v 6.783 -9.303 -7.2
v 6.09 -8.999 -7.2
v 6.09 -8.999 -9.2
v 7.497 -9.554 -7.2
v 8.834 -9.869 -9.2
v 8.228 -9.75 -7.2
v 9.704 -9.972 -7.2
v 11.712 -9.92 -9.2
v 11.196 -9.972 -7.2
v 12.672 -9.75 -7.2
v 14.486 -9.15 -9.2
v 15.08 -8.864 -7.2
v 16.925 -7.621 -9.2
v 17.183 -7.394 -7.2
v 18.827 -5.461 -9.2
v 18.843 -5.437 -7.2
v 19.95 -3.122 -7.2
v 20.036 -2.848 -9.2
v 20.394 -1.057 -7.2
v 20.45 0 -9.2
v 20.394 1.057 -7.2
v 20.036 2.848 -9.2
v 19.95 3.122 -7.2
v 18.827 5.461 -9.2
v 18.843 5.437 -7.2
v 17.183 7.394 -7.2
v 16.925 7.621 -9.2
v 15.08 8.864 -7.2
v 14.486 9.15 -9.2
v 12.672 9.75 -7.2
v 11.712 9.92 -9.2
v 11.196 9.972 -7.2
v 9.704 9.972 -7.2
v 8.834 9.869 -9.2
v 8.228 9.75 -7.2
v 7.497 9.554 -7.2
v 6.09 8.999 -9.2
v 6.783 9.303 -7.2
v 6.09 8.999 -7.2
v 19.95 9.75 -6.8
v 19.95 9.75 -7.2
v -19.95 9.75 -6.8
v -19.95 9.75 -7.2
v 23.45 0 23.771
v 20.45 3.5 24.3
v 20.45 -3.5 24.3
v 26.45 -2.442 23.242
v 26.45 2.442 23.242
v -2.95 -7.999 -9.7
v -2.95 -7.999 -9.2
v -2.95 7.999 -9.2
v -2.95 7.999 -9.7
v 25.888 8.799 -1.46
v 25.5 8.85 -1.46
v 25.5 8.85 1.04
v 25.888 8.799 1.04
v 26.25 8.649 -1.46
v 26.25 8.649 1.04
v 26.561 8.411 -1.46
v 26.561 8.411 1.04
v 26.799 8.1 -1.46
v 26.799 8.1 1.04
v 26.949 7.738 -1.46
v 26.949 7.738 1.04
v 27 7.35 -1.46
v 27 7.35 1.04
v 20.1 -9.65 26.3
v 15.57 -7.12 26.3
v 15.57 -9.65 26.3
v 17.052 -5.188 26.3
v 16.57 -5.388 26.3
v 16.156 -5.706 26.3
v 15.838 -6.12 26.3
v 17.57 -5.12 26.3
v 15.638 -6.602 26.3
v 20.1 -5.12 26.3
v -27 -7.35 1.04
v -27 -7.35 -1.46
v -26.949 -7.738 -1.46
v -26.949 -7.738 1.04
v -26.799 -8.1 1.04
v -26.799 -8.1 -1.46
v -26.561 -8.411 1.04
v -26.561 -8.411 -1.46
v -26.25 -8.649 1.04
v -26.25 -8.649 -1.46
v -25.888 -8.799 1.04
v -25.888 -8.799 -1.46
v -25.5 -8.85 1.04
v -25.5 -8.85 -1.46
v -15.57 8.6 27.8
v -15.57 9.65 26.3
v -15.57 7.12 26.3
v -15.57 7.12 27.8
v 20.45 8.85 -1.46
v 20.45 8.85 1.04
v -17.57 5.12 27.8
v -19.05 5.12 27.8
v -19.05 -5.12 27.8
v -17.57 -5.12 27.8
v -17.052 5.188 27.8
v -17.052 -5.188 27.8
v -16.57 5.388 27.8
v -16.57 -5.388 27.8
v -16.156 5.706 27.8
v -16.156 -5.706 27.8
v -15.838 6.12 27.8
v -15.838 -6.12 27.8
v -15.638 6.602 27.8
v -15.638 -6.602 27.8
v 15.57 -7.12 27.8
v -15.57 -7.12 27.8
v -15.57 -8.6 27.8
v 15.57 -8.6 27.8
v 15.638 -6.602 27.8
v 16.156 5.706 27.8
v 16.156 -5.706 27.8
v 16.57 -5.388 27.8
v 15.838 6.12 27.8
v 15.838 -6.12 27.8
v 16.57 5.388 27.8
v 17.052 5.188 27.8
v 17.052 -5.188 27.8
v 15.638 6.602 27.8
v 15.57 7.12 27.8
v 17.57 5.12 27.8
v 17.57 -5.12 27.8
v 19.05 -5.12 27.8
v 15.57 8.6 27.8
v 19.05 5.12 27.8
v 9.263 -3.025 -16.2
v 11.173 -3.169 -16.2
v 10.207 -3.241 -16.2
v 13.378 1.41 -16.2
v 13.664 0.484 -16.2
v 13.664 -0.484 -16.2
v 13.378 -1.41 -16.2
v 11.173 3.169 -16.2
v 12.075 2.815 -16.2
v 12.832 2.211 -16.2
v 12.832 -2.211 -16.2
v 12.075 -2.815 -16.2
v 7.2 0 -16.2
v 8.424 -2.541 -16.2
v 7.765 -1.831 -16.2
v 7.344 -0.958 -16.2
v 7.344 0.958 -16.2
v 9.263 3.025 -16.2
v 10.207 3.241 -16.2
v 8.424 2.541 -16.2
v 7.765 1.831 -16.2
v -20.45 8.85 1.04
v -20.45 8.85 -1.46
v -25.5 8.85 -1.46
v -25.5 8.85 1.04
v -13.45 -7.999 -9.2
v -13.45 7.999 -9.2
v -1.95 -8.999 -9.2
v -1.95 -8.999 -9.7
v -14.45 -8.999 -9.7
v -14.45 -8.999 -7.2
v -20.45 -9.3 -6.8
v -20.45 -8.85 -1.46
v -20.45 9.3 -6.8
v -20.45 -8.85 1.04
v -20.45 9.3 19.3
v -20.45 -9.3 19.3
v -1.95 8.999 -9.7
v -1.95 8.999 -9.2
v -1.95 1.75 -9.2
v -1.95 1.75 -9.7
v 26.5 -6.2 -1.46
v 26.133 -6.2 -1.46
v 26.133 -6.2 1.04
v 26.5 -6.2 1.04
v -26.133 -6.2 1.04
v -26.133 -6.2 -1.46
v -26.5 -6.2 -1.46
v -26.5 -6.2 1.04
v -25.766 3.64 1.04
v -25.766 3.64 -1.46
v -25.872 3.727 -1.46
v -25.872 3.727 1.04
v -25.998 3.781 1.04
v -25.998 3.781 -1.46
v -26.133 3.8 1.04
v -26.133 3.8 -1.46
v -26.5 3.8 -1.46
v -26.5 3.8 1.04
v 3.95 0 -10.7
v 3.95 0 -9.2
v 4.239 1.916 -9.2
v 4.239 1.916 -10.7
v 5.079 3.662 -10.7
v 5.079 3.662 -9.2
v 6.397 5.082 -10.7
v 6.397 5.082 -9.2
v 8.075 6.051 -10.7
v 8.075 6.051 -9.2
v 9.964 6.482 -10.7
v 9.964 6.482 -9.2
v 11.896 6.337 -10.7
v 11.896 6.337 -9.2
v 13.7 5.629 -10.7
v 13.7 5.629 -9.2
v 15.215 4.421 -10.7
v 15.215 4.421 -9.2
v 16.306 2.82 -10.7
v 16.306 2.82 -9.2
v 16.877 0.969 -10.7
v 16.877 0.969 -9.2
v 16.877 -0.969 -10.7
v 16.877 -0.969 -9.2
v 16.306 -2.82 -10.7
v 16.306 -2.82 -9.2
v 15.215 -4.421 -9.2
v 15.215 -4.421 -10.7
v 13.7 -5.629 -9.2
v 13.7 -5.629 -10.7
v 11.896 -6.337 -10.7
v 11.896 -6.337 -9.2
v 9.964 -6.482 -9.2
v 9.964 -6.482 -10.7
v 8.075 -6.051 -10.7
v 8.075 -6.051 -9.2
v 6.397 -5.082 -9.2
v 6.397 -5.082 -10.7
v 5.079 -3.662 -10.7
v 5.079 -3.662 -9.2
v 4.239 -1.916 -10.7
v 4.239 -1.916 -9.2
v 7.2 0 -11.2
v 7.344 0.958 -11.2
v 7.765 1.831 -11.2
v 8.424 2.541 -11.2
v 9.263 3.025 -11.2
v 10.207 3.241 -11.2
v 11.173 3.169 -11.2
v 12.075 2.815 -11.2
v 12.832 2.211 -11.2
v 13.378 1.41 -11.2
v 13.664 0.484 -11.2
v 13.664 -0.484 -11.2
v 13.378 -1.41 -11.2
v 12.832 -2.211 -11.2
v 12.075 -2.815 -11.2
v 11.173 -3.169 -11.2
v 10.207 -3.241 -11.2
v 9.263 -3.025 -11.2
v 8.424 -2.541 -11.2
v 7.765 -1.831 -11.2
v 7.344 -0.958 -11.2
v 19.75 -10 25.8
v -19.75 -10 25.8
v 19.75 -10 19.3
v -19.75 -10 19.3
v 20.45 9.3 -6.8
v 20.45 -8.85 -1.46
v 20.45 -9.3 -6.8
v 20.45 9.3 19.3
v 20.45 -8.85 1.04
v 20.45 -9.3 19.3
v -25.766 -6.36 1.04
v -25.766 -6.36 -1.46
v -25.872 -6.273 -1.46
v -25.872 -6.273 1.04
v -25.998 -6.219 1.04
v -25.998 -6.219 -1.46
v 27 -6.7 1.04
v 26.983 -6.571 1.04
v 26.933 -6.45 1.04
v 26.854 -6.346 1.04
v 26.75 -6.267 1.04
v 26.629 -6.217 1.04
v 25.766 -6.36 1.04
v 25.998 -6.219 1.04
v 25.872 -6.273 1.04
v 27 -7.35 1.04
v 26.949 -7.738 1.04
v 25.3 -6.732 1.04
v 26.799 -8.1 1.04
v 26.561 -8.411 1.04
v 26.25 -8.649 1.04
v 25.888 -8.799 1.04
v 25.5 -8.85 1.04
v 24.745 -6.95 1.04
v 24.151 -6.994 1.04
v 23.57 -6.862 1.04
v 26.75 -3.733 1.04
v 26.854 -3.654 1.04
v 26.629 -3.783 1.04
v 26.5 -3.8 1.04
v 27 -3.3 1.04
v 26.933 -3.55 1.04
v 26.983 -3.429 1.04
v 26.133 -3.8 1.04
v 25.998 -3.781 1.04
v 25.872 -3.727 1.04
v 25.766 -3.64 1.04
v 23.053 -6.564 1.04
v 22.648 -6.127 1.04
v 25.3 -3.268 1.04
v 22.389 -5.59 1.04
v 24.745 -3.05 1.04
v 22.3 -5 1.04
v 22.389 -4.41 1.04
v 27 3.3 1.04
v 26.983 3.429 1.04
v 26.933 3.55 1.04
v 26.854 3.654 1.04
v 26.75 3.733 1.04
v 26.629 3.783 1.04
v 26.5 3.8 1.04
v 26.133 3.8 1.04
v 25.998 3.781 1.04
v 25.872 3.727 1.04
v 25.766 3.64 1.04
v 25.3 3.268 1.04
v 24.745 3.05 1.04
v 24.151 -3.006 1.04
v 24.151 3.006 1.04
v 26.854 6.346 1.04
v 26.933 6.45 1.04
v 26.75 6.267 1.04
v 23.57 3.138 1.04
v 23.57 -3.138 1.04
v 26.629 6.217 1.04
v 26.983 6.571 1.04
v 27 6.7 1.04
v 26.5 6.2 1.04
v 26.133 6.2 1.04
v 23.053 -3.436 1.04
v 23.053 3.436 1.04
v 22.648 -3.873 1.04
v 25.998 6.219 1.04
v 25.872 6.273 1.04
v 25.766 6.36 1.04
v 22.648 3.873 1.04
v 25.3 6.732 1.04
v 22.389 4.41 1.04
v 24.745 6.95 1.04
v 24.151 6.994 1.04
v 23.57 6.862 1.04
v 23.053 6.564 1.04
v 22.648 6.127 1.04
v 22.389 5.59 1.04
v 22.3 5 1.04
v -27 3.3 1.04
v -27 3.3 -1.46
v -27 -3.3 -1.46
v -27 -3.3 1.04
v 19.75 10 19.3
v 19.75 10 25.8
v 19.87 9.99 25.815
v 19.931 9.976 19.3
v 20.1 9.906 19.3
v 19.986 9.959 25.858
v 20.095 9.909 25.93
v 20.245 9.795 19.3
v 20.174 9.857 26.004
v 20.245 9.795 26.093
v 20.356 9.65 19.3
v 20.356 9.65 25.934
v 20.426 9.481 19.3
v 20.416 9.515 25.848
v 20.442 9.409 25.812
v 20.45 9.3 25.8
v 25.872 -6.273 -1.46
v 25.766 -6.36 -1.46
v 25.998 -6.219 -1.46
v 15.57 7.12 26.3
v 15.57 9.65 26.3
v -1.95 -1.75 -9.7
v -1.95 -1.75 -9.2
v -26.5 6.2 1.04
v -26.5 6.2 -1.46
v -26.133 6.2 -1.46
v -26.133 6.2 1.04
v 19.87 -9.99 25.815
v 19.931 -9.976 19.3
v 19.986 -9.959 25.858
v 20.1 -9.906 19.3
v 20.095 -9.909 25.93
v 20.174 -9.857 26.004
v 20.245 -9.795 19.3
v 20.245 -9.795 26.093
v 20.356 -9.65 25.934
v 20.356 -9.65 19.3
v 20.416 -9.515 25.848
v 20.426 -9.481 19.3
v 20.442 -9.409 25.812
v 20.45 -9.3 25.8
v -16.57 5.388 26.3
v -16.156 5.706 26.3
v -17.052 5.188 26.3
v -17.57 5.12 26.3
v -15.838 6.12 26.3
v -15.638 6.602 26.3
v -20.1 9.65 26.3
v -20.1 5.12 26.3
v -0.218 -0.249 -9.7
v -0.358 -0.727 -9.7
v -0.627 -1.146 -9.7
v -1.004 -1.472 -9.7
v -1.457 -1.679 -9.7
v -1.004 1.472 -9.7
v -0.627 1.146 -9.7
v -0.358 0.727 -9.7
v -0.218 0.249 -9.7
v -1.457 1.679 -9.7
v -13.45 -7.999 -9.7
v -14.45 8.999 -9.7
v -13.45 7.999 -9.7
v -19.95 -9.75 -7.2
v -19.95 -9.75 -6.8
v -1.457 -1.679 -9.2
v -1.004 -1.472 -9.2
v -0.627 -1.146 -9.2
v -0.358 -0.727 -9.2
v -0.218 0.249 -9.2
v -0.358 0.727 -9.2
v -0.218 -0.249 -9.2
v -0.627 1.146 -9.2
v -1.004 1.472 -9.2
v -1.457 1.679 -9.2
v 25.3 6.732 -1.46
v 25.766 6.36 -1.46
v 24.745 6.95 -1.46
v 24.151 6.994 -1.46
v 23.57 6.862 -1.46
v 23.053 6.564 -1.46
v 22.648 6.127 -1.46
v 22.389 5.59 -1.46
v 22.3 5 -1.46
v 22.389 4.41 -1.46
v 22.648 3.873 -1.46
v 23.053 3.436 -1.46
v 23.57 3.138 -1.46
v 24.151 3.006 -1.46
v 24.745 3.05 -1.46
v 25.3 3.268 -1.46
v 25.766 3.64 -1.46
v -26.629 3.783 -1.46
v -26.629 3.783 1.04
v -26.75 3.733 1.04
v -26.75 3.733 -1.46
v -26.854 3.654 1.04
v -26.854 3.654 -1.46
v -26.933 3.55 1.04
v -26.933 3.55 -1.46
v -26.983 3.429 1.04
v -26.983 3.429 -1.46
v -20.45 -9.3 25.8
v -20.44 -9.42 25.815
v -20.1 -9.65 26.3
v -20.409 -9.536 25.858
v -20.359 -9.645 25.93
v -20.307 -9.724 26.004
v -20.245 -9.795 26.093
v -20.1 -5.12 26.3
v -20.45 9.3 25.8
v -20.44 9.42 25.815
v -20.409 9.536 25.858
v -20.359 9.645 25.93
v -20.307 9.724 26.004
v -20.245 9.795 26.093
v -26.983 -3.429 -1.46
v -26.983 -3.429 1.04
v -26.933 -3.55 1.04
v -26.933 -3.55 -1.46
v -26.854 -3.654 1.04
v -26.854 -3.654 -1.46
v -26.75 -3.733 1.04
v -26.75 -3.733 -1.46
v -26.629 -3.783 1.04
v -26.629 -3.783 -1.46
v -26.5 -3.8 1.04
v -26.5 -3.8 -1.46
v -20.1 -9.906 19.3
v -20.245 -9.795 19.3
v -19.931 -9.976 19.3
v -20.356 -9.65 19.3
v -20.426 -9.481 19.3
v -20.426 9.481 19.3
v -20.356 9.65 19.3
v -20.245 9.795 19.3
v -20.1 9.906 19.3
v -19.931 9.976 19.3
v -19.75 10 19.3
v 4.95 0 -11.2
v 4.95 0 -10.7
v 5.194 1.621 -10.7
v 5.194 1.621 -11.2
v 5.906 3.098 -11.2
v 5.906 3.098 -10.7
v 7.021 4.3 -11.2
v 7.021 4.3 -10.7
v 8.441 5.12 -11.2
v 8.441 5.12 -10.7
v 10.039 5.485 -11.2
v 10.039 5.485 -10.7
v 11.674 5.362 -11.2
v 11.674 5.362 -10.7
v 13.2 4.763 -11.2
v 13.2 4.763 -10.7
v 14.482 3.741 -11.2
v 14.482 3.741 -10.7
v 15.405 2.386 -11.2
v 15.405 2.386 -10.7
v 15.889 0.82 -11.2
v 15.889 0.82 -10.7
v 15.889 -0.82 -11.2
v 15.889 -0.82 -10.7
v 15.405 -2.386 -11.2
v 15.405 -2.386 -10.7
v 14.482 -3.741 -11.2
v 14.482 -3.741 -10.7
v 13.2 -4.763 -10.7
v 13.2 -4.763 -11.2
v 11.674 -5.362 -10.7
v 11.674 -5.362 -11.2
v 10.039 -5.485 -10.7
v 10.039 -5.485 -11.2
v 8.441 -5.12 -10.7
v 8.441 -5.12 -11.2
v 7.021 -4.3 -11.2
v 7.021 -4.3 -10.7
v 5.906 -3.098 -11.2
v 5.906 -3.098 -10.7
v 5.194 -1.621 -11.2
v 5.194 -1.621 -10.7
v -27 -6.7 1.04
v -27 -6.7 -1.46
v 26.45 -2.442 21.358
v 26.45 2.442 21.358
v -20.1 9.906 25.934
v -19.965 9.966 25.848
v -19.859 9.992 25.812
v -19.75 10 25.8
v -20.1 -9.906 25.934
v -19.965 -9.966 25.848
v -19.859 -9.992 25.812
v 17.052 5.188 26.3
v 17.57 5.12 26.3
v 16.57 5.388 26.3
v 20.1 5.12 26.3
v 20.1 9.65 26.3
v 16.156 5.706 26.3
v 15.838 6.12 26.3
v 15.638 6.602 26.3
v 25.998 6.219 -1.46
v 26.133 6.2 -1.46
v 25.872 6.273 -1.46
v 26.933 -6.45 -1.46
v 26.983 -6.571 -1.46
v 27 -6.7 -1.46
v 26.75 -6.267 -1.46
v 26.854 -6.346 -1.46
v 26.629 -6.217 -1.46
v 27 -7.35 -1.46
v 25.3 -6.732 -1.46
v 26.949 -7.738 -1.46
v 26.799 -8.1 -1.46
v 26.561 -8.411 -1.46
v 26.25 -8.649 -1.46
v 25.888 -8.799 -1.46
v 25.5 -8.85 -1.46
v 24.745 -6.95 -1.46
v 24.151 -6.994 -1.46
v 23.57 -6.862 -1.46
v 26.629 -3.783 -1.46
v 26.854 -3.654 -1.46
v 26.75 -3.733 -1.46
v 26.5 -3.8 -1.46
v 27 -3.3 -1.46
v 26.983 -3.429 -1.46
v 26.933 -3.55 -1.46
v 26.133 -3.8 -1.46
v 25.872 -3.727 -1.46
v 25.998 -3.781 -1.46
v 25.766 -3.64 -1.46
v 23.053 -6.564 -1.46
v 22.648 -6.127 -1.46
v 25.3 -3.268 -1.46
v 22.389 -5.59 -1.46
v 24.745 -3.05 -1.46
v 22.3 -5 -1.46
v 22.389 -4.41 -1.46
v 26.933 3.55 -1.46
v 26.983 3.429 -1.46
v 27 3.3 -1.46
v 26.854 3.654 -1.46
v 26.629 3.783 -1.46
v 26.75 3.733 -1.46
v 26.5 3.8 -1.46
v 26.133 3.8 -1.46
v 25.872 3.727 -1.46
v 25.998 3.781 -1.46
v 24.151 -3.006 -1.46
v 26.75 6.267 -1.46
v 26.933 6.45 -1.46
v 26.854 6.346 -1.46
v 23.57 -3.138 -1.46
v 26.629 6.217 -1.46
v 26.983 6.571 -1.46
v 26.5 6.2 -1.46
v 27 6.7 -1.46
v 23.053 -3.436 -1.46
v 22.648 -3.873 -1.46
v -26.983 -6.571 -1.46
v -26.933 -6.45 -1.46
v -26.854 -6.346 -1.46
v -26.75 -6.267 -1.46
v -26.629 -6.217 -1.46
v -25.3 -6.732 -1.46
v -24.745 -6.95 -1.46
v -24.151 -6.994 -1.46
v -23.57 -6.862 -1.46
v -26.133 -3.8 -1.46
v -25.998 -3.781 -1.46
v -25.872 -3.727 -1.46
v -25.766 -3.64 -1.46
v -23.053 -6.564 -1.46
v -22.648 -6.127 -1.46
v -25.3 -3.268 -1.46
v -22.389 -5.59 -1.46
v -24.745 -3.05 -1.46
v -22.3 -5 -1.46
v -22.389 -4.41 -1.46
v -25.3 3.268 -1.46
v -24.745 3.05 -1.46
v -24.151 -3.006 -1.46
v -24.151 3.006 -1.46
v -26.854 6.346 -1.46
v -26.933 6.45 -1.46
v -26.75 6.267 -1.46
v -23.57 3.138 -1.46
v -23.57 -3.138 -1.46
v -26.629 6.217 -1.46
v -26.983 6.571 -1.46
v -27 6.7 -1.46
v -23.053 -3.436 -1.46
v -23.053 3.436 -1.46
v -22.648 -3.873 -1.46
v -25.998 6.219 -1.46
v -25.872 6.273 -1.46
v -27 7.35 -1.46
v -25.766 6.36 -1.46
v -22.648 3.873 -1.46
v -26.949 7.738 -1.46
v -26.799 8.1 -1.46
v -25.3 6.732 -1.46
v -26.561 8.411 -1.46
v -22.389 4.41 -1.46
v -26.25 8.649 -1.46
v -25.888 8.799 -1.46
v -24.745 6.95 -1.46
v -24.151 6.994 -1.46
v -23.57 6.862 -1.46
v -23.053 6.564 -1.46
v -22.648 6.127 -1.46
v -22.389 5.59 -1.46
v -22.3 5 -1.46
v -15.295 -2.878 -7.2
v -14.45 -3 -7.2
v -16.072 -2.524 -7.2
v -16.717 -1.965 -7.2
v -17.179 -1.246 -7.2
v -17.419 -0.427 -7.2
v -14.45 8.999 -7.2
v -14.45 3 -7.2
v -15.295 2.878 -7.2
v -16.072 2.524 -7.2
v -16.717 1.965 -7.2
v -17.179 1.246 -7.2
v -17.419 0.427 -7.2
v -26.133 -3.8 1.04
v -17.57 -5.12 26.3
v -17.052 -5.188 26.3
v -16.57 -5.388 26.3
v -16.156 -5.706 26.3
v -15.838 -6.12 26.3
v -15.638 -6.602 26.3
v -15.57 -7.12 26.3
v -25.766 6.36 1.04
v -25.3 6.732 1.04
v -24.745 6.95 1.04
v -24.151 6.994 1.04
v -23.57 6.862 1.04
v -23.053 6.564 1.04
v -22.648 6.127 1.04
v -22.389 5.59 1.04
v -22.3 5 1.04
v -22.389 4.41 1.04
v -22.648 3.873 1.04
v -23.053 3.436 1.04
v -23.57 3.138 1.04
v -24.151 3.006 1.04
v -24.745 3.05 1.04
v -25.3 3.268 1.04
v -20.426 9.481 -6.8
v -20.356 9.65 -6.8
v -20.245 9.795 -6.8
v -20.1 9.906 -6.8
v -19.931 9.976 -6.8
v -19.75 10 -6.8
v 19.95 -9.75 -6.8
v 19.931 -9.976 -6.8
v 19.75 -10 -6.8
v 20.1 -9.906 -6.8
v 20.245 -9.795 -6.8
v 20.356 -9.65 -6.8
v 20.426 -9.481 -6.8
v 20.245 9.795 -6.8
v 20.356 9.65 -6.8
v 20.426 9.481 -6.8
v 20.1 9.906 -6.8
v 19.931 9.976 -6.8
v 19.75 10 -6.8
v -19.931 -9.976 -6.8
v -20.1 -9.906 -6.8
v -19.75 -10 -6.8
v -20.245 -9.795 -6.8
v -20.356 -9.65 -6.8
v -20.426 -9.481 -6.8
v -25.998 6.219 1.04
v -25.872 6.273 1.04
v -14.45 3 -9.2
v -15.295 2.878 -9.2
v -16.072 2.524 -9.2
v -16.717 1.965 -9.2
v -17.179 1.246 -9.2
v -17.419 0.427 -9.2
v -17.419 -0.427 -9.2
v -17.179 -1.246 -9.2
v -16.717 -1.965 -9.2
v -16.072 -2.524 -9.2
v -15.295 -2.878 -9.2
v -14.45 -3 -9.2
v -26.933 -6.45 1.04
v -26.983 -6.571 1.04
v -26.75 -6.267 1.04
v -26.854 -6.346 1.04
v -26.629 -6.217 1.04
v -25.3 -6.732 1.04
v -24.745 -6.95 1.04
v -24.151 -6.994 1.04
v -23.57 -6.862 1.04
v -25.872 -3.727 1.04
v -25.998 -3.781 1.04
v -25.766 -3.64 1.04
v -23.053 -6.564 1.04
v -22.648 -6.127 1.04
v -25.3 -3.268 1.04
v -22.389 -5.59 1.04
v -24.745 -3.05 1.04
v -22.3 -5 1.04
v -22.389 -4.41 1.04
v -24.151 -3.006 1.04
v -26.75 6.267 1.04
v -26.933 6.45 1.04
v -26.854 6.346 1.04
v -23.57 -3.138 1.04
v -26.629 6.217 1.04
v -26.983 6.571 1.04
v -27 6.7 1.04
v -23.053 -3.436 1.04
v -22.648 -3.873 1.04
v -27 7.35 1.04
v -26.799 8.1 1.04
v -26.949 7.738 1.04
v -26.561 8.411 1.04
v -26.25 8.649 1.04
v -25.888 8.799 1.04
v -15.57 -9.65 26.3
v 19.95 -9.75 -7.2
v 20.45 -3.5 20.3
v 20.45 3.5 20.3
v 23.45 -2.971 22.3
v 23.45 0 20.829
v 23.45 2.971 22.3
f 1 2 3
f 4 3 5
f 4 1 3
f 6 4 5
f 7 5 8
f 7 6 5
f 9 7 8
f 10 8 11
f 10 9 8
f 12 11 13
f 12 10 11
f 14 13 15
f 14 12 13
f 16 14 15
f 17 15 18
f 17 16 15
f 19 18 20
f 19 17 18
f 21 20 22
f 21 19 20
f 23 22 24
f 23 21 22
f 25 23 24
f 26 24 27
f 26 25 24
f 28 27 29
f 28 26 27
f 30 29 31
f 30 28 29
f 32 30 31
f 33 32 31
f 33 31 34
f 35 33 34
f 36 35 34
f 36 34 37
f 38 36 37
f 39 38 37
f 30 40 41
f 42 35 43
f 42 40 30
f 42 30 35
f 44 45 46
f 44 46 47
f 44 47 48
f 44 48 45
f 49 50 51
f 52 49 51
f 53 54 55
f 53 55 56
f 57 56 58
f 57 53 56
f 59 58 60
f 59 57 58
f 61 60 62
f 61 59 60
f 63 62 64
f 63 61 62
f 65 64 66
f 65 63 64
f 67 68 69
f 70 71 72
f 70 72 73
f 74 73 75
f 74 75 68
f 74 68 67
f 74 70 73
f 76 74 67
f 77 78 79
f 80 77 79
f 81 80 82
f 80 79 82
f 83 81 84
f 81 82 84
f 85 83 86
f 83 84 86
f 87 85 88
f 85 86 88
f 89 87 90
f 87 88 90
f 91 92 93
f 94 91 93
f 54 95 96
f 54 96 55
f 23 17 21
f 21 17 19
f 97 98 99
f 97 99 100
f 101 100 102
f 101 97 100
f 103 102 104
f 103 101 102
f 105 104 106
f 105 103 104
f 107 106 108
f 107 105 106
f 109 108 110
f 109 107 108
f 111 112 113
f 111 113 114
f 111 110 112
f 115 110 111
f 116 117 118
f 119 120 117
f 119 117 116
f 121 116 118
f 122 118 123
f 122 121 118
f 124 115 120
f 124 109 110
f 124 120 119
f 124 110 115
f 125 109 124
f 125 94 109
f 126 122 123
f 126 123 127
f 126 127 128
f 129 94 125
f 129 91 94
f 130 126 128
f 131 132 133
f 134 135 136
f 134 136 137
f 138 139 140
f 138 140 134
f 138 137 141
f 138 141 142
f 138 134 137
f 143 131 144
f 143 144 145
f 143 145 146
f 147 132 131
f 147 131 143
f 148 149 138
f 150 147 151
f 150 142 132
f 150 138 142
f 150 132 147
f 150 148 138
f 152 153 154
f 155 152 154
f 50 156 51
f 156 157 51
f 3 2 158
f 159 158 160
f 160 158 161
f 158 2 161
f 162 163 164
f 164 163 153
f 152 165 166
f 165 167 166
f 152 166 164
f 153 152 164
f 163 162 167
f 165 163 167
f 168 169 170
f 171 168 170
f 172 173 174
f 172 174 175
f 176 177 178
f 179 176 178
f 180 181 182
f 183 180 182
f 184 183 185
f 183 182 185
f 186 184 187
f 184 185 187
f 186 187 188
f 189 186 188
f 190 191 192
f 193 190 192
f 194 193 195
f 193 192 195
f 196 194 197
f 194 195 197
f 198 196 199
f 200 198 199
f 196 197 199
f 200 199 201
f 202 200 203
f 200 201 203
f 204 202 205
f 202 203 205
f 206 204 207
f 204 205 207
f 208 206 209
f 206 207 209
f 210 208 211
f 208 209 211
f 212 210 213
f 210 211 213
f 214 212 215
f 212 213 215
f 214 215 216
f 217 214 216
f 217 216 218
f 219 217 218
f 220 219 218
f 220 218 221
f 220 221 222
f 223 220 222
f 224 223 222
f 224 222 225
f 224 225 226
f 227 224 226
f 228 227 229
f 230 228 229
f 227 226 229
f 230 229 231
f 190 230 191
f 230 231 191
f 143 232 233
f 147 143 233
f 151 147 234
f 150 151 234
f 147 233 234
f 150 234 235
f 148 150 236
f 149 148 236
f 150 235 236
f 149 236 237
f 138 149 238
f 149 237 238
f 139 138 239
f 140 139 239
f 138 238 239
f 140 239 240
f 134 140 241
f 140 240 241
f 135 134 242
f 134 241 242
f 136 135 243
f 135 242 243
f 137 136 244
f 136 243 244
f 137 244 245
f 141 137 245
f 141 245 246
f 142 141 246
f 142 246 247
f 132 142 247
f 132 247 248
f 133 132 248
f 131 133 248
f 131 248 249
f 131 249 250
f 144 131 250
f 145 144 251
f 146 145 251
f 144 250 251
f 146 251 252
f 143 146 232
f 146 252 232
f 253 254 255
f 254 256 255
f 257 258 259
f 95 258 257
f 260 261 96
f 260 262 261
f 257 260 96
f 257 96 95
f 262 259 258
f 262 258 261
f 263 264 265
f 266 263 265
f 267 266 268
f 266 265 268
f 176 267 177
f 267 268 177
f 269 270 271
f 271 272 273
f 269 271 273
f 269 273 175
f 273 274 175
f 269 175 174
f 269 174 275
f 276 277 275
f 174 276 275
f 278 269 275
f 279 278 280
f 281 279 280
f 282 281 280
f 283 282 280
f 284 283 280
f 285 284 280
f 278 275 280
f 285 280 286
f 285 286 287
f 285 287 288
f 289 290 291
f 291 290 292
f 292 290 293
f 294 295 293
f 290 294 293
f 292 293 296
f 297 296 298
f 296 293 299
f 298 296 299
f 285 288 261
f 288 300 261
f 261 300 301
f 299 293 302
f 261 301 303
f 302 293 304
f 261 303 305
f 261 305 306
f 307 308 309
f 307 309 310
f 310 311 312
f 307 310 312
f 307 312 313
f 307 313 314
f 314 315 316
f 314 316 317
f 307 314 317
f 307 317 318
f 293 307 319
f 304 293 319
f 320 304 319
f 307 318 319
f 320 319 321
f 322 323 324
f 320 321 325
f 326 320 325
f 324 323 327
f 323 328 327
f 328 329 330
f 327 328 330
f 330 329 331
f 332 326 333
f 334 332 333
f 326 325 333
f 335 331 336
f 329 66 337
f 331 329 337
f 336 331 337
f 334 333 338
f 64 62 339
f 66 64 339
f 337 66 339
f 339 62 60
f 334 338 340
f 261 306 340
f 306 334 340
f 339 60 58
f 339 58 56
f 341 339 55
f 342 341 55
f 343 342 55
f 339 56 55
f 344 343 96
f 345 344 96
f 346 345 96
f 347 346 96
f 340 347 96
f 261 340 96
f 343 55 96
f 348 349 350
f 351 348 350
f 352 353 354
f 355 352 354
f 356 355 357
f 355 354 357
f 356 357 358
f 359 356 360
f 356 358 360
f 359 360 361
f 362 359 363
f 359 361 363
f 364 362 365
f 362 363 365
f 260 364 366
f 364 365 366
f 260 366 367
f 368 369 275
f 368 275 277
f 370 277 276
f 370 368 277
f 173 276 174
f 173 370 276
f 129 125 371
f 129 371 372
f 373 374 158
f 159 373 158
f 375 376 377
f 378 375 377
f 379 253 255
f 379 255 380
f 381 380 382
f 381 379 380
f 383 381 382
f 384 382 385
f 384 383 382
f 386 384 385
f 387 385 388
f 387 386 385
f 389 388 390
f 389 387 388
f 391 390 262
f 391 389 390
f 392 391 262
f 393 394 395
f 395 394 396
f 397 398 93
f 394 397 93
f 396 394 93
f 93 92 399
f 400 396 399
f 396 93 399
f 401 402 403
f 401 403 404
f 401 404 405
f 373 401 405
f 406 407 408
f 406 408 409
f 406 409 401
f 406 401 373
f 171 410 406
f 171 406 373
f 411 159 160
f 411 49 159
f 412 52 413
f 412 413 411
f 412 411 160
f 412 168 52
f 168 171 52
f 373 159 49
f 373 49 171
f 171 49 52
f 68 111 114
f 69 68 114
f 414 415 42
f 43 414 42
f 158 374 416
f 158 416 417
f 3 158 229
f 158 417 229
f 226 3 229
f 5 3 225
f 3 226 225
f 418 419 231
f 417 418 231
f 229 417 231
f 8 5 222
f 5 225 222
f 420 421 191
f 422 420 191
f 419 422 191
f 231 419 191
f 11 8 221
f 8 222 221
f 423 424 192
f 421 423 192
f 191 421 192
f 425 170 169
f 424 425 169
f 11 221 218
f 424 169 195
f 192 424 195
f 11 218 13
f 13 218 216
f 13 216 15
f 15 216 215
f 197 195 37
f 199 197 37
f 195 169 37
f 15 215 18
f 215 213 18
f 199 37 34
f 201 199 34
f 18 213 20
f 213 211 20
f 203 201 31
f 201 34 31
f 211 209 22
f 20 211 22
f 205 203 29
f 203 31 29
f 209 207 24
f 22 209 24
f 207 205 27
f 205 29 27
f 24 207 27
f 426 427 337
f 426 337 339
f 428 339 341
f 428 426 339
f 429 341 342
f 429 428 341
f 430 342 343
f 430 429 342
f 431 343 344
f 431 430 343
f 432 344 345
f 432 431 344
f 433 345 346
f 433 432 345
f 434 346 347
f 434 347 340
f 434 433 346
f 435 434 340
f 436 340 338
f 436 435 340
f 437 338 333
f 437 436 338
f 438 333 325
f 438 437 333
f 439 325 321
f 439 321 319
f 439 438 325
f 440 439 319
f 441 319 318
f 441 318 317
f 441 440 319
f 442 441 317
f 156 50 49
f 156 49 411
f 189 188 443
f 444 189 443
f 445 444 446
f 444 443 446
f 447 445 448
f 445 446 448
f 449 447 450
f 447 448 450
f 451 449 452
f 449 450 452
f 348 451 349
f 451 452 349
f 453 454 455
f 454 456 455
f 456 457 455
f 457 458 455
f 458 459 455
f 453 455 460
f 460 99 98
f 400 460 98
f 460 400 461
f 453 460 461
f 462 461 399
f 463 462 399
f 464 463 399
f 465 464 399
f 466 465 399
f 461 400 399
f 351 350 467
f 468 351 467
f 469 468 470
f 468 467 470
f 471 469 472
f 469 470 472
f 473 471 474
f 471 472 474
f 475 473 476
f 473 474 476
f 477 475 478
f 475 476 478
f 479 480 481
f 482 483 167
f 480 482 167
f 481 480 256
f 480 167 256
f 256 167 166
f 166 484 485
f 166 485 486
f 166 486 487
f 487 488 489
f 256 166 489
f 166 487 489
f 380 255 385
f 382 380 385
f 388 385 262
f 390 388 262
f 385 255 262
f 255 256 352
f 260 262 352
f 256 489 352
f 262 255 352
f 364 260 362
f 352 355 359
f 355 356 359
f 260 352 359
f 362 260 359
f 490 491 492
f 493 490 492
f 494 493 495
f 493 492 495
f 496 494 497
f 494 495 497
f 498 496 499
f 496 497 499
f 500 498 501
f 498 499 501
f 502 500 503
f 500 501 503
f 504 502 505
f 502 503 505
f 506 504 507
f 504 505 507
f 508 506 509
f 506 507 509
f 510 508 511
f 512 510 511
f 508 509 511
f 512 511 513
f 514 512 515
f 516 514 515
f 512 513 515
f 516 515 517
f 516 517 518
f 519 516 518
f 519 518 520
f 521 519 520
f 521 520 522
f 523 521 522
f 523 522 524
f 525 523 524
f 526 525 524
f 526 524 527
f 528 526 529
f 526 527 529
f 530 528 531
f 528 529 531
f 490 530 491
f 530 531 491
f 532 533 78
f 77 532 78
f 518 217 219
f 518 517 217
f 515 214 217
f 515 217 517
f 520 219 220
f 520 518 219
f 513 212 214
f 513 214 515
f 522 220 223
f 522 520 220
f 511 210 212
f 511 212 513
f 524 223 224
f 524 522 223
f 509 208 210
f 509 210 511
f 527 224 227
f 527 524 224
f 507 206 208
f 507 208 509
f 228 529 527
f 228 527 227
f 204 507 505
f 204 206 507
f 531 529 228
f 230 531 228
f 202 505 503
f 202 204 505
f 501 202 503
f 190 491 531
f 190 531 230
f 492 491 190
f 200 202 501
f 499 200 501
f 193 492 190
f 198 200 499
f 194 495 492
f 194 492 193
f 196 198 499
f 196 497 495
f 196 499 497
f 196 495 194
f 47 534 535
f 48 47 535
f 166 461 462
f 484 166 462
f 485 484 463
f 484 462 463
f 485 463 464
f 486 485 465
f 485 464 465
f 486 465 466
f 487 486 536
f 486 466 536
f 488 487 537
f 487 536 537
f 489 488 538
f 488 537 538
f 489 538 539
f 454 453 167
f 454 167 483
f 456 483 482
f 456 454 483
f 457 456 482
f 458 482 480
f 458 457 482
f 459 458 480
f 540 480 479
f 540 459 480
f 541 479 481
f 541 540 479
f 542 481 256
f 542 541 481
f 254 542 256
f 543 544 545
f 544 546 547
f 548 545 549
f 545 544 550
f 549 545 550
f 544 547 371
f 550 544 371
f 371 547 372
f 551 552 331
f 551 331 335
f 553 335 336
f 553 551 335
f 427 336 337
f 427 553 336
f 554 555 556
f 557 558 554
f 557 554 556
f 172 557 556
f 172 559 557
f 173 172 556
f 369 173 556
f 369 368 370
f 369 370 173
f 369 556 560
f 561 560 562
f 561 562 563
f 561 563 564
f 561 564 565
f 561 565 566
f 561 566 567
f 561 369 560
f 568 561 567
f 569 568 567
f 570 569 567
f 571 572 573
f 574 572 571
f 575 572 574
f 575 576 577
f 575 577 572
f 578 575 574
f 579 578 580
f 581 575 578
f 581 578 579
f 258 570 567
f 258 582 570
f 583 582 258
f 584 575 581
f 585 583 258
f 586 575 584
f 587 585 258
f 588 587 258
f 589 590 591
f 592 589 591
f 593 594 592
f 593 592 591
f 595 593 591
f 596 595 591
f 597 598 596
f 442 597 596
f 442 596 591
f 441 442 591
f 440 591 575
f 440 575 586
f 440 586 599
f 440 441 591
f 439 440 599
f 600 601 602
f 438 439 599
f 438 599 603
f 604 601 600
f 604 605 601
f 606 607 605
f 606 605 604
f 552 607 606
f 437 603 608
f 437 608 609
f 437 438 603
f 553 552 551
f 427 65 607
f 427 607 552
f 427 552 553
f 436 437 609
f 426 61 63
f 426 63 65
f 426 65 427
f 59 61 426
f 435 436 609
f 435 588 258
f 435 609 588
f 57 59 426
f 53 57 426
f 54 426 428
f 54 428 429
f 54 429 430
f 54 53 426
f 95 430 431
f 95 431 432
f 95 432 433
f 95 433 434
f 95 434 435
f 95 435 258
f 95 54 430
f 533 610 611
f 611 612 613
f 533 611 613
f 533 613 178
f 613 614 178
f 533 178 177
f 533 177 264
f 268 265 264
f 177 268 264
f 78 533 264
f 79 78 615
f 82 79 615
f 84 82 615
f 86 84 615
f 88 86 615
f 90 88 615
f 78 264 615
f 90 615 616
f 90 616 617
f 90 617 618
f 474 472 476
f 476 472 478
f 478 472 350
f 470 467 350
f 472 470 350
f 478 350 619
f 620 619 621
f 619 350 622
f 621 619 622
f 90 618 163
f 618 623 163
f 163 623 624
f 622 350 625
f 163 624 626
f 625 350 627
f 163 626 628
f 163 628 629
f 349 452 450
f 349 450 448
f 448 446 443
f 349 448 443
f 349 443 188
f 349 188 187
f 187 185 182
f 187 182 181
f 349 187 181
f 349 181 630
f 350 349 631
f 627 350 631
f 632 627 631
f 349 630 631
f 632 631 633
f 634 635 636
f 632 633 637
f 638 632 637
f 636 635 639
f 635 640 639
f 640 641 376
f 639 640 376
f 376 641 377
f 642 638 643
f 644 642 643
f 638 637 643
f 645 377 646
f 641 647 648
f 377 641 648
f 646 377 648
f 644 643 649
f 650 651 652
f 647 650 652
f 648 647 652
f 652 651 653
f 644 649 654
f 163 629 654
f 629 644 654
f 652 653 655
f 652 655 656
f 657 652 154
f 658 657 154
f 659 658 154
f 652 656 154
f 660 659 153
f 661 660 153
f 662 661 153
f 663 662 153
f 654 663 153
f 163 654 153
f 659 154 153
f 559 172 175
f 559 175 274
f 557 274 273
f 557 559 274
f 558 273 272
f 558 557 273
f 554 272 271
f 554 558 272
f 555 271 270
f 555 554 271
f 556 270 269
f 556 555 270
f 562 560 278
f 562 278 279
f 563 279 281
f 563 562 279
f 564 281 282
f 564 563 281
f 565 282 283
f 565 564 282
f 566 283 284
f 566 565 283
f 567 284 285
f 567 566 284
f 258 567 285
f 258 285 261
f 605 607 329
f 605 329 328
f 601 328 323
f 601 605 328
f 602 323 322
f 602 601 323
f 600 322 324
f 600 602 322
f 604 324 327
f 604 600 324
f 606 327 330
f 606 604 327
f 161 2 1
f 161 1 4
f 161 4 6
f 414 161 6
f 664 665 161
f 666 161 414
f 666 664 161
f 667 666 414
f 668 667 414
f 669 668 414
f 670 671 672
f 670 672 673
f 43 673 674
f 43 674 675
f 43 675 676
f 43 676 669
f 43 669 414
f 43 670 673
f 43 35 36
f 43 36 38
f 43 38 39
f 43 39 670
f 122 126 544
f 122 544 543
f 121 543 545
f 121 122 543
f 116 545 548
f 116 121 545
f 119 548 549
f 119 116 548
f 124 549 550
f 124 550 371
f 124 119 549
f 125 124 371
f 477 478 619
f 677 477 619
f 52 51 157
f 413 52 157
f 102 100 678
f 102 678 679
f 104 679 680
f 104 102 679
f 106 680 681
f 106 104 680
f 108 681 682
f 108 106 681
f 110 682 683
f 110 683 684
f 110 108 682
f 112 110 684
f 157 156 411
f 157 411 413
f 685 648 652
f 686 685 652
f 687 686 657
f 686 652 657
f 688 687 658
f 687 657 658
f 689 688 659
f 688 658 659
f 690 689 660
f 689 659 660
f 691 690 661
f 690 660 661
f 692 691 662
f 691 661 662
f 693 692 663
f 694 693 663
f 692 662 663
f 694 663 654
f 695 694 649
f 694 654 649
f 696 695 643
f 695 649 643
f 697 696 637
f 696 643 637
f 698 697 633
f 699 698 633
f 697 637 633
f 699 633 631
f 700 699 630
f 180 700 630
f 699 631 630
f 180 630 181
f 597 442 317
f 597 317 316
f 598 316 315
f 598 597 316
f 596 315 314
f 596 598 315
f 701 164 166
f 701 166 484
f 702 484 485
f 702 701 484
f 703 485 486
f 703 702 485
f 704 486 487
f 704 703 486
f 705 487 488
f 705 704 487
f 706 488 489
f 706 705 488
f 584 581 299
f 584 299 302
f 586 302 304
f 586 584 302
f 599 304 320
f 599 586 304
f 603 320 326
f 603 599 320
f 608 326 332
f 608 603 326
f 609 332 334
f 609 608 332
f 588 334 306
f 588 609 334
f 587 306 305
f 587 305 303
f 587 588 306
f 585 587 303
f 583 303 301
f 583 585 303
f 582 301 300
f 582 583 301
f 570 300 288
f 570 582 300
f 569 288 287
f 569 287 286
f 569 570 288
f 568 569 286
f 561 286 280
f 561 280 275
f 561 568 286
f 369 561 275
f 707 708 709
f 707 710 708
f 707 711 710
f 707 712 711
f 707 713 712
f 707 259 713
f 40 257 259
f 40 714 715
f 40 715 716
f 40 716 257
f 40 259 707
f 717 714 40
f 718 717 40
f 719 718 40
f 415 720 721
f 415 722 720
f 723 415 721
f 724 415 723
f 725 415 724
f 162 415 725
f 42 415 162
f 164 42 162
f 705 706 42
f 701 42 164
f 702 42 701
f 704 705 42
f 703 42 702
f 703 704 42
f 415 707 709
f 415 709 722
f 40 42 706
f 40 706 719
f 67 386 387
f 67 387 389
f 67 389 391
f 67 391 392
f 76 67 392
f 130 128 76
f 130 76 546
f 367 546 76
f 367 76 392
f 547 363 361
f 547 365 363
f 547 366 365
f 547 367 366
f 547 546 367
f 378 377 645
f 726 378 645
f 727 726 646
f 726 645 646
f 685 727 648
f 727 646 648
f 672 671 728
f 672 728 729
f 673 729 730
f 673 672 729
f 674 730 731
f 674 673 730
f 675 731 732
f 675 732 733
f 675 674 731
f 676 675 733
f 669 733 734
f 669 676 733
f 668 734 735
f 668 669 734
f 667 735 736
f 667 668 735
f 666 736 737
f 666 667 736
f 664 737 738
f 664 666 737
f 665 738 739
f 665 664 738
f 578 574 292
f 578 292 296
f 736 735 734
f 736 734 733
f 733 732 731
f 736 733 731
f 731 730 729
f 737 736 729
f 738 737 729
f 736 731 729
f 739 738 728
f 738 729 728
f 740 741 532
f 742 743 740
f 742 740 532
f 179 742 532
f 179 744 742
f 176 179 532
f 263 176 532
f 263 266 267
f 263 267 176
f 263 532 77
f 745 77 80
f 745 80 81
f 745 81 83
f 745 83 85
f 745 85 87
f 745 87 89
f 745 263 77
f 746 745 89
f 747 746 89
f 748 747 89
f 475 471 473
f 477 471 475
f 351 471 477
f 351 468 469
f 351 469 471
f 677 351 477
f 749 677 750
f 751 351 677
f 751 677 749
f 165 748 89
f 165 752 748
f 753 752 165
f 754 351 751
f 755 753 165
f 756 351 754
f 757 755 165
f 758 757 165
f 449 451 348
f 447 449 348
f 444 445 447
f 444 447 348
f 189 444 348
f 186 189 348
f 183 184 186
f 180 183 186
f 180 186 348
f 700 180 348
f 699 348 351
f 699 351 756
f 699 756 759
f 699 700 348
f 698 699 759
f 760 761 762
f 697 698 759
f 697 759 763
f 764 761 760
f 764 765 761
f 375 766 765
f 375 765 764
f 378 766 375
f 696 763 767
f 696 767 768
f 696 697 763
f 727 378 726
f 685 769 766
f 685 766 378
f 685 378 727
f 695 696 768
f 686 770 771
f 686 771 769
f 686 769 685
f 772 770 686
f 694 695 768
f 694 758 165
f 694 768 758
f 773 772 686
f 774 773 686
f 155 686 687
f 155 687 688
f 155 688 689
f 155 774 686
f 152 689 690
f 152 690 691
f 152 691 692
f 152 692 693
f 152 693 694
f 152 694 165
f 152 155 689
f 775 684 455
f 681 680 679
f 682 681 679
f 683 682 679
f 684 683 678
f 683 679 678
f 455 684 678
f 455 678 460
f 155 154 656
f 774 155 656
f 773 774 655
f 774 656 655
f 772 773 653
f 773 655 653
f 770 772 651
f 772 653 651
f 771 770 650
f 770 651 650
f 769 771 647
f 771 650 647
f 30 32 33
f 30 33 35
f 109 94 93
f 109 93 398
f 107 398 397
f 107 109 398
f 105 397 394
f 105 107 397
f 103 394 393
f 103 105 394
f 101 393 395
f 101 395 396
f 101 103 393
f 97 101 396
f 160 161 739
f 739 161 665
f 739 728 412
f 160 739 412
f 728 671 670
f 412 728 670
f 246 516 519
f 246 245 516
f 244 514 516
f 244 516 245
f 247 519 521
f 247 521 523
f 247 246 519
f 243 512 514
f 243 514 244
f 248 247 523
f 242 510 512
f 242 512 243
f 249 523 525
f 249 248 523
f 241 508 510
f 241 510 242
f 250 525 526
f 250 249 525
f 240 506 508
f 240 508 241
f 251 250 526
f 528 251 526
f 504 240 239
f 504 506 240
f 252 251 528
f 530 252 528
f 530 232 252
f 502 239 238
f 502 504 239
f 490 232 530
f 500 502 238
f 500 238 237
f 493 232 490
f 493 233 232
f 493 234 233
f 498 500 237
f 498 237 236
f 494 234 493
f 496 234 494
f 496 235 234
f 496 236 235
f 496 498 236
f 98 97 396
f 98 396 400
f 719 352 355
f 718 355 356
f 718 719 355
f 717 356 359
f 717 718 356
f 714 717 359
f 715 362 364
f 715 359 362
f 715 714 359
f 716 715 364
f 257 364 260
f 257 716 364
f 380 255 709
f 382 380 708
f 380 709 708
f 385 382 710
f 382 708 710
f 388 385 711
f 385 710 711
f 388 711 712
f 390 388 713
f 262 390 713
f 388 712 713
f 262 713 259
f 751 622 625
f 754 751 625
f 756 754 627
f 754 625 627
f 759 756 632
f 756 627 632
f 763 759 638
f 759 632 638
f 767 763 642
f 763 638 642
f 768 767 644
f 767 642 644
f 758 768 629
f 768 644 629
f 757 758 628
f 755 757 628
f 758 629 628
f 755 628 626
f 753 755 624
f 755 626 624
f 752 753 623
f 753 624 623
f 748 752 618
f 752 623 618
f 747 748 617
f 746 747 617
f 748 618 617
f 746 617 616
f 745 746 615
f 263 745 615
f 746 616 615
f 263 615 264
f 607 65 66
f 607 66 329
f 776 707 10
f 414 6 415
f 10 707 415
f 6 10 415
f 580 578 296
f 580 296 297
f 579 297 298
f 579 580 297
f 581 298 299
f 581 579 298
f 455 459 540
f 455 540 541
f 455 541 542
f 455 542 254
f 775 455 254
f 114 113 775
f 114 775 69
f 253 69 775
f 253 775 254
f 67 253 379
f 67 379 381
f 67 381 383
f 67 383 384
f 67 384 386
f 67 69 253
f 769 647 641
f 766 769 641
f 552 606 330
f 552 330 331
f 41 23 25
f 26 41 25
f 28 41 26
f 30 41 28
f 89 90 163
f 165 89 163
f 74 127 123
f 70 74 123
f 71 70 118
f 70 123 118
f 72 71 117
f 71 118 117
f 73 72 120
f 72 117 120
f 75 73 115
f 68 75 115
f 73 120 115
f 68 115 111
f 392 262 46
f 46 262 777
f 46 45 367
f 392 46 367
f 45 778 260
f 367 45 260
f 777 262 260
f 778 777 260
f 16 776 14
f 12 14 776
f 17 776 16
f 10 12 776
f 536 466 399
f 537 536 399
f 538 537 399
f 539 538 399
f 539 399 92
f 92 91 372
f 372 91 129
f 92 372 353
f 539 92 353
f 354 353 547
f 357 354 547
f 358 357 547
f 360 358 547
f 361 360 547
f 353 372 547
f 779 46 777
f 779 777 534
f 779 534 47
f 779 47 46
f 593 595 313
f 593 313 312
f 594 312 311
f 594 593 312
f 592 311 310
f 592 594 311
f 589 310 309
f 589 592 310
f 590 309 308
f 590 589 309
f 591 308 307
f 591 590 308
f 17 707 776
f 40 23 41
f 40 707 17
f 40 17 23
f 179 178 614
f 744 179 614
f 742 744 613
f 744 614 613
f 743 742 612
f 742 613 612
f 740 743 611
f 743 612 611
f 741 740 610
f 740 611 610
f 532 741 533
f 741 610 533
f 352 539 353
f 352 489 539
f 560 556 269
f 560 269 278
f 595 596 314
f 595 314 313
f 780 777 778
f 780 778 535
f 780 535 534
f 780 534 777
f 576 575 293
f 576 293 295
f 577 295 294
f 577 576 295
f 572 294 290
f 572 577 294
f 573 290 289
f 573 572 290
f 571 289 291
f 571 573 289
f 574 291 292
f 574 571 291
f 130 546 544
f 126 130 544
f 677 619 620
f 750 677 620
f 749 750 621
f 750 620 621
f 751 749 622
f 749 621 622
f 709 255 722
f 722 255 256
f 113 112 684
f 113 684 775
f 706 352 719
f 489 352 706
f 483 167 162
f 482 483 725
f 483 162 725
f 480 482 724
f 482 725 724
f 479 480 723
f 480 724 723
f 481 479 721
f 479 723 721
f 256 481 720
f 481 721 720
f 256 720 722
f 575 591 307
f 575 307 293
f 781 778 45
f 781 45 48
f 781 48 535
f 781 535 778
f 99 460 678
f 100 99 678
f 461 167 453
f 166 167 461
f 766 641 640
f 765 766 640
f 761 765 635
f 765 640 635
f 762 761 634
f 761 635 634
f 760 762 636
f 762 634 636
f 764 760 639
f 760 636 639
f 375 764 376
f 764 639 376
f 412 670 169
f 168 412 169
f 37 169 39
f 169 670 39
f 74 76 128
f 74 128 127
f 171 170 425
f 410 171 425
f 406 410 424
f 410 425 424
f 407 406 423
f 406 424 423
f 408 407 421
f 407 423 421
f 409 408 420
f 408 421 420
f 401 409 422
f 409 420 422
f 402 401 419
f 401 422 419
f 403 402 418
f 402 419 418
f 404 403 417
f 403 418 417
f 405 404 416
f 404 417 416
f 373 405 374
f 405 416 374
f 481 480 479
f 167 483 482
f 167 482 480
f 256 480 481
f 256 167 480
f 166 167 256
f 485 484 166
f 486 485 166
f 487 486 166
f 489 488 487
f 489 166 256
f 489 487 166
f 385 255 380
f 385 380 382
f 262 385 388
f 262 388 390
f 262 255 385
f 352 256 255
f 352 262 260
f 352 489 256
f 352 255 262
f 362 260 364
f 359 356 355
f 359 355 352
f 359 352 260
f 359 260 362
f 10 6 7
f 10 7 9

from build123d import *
from OCP.BRepFilletAPI import BRepFilletAPI_MakeChamfer

# Parameters (mm, degrees)
SKETCH1_W            = 40.9
SKETCH1_H            = 20
BOSS_EXTRUDE1_DEPTH  = 19.3
SKETCH3_W            = 40.9
SKETCH3_H            = 20
BOSS_EXTRUDE2_DEPTH  = 6.8
SKETCH4_W            = 40.9
SKETCH4_H            = 20
BOSS_EXTRUDE3_DEPTH  = 8.5
CHAMFER1_SIZE        = 2
CHAMFER1_SIZE2       = 1.400415076
CUT_EXTRUDE1_DEPTH   = 1.5
SKETCH6_W            = 39.9
SKETCH6_H            = 19.5
BOSS_EXTRUDE4_DEPTH  = 0.4
BOSS_EXTRUDE5_DEPTH  = 2
SKETCH8_R            = 6.5
BOSS_EXTRUDE6_DEPTH  = 1.5
SKETCH9_R            = 5.5
BOSS_EXTRUDE8_DEPTH  = 0.5
SKETCH11_R           = 3.25
BOSS_EXTRUDE9_DEPTH  = 5
SKETCH12_W           = 10.5
SKETCH12_H           = 15.998933302
BOSS_EXTRUDE10_DEPTH = 0.5
FILLET1_R            = 0.7
FILLET2_R            = 0.7
FILLET3_R            = 0.7
BOSS_EXTRUDE11_START = -5.74
BOSS_EXTRUDE11_DEPTH = 2.5
SKETCH14_W           = 4
SKETCH14_H           = 7
BOSS_EXTRUDE12_DEPTH = 6
BOSS_EXTRUDE12_TAPER = 10


with BuildPart() as part:
    # Sketch1 → Boss-Extrude1 (new body)
    with BuildSketch(Plane.XY):
        Rectangle(SKETCH1_W, SKETCH1_H)
    extrude(amount=BOSS_EXTRUDE1_DEPTH)

    # Fillet1
    fillet1_edges = [part.edges().sort_by_distance(p)[0] for p in [
        (-20.45, 10, 9.65),
        (20.45, 10, 9.65),
        (20.45, -10, 9.65),
        (-20.45, -10, 9.65),
    ]]
    fillet(fillet1_edges, radius=FILLET1_R)



with BuildPart() as body_2:
    # Sketch3 → Boss-Extrude2 (new body)
    with BuildSketch(Plane(origin=(0, 0, 0), x_dir=(-1, 0, 0), z_dir=(0, 0, -1))):
        Rectangle(SKETCH3_W, SKETCH3_H)
    extrude(amount=BOSS_EXTRUDE2_DEPTH)

    # Sketch6 → Boss-Extrude4 (add)
    with BuildSketch(Plane(origin=(0, 0, -6.8), x_dir=(-1, 0, 0), z_dir=(0, 0, -1))):
        Rectangle(SKETCH6_W, SKETCH6_H)
    extrude(amount=BOSS_EXTRUDE4_DEPTH)

    # Sketch7 → Boss-Extrude5 (add)
    with BuildSketch(Plane(origin=(0, 0, -7.2), x_dir=(-1, 0, 0), z_dir=(0, 0, -1))):
        with BuildLine():
            Line((-6.09, 8.999466651), (14.45, 8.999466651))
            Line((14.45, 8.999466651), (14.45, 3))
            ThreePointArc((14.45, 3), (17.45, 0), (14.45, -3))
            Line((14.45, -3), (14.45, -8.999466651))
            Line((14.45, -8.999466651), (-6.09, -8.999466651))
            ThreePointArc((-6.09, -8.999466651), (-20.45, 0), (-6.09, 8.999466651))
        make_face()
    extrude(amount=BOSS_EXTRUDE5_DEPTH)

    # Sketch8 → Boss-Extrude6 (add)
    with BuildSketch(Plane(origin=(0, 0, -9.2), x_dir=(-1, 0, 0), z_dir=(0, 0, -1))):
        with Locations((-10.45, 0)):
            Circle(SKETCH8_R)
    extrude(amount=BOSS_EXTRUDE6_DEPTH)

    # Sketch9 → Boss-Extrude8 (add)
    with BuildSketch(Plane(origin=(0, 0, -10.7), x_dir=(-1, 0, 0), z_dir=(0, 0, -1))):
        with Locations((-10.45, 0)):
            Circle(SKETCH9_R)
    extrude(amount=BOSS_EXTRUDE8_DEPTH)

    # Sketch11 → Boss-Extrude9 (add)
    with BuildSketch(Plane(origin=(0, 0, -11.2), x_dir=(-1, 0, 0), z_dir=(0, 0, -1))):
        with Locations((-10.45, 0)):
            Circle(SKETCH11_R)
    extrude(amount=BOSS_EXTRUDE9_DEPTH)

    # Sketch12 → Boss-Extrude10 (add)
    with BuildSketch(Plane(origin=(0, 0, -9.2), x_dir=(-1, 0, 0), z_dir=(0, 0, -1))):
        with BuildLine():
            Line((14.45, 8.999466651), (1.95, 8.999466651))
            Line((1.95, 8.999466651), (1.95, 1.75))
            ThreePointArc((1.95, 1.75), (0.2, 0), (1.95, -1.75))
            Line((1.95, -1.75), (1.95, -8.999466651))
            Line((1.95, -8.999466651), (14.45, -8.999466651))
            Line((14.45, -8.999466651), (14.45, 8.999466651))
        make_face()
        with Locations((8.2, 0)):
            Rectangle(SKETCH12_W, SKETCH12_H, mode=Mode.SUBTRACT)
    extrude(amount=BOSS_EXTRUDE10_DEPTH)

    # Fillet2
    fillet2_edges = [body_2.edges().sort_by_distance(p)[0] for p in [
        (20.45, -10, -3.4),
        (20.45, 10, -3.4),
        (-20.45, 10, -3.4),
        (-20.45, -10, -3.4),
    ]]
    fillet(fillet2_edges, radius=FILLET2_R)


with BuildPart() as body_3:
    # Sketch4 → Boss-Extrude3 (new body)
    with BuildSketch(Plane.XY.offset(19.3)):
        Rectangle(SKETCH4_W, SKETCH4_H)
    extrude(amount=BOSS_EXTRUDE3_DEPTH)

    # Chamfer1: one chamfer whose edges measure the first distance from different faces: ONE call of the kernel's chamfer builder (chamfer() names one face for all edges)
    chamfer1_edges_1 = [body_3.edges().sort_by_distance(p)[0] for p in [
        (0, -10, 27.8),
    ]]
    chamfer1_side_1 = [body_3.faces().sort_by_distance(p)[0] for p in [
        (0, -10, 23.55),
    ]]
    chamfer1_edges_2 = [body_3.edges().sort_by_distance(p)[0] for p in [
        (20.45, 0, 27.8),
    ]]
    chamfer1_side_2 = [body_3.faces().sort_by_distance(p)[0] for p in [
        (20.45, 0, 23.55),
    ]]
    chamfer1_edges_3 = [body_3.edges().sort_by_distance(p)[0] for p in [
        (0, 10, 27.8),
    ]]
    chamfer1_side_3 = [body_3.faces().sort_by_distance(p)[0] for p in [
        (0, 10, 23.55),
    ]]
    chamfer1_edges_4 = [body_3.edges().sort_by_distance(p)[0] for p in [
        (-20.45, 0, 27.8),
    ]]
    chamfer1_side_4 = [body_3.faces().sort_by_distance(p)[0] for p in [
        (-20.45, 0, 23.55),
    ]]
    chamfer1 = BRepFilletAPI_MakeChamfer(body_3.part.solid().wrapped)
    for e in chamfer1_edges_1:
        chamfer1.Add(CHAMFER1_SIZE, CHAMFER1_SIZE2, e.wrapped, chamfer1_side_1[0].wrapped)  # the first distance lies on this face
    for e in chamfer1_edges_2:
        chamfer1.Add(CHAMFER1_SIZE, CHAMFER1_SIZE2, e.wrapped, chamfer1_side_2[0].wrapped)  # the first distance lies on this face
    for e in chamfer1_edges_3:
        chamfer1.Add(CHAMFER1_SIZE, CHAMFER1_SIZE2, e.wrapped, chamfer1_side_3[0].wrapped)  # the first distance lies on this face
    for e in chamfer1_edges_4:
        chamfer1.Add(CHAMFER1_SIZE, CHAMFER1_SIZE2, e.wrapped, chamfer1_side_4[0].wrapped)  # the first distance lies on this face
    add(Compound.cast(chamfer1.Shape()), mode=Mode.REPLACE)

    # Sketch5 → Cut-Extrude1 (cut)
    with BuildSketch(Plane.XY.offset(27.8)):
        with BuildLine():
            Line((-20.45, 10), (-15.57, 10))
            Line((-15.57, 10), (-15.57, 7.12))
            ThreePointArc((-15.57, 7.12), (-16.155786438, 5.705786438), (-17.57, 5.12))
            Line((-17.57, 5.12), (-20.45, 5.12))
            Line((-20.45, 5.12), (-20.45, 10))
        make_face()
        with BuildLine():
            Line((20.45, 5.12), (17.57, 5.12))
            ThreePointArc((17.57, 5.12), (16.155786438, 5.705786438), (15.57, 7.12))
            Line((15.57, 7.12), (15.57, 10))
            Line((15.57, 10), (20.45, 10))
            Line((20.45, 10), (20.45, 5.12))
        make_face()
        with BuildLine():
            Line((-20.45, -5.12), (-17.57, -5.12))
            ThreePointArc((-17.57, -5.12), (-16.155786438, -5.705786438), (-15.57, -7.12))
            Line((-15.57, -7.12), (-15.57, -10))
            Line((-15.57, -10), (-20.45, -10))
            Line((-20.45, -10), (-20.45, -5.12))
        make_face()
        with BuildLine():
            Line((20.45, -10), (20.45, -5.12))
            Line((20.45, -5.12), (17.57, -5.12))
            ThreePointArc((17.57, -5.12), (16.155786438, -5.705786438), (15.57, -7.12))
            Line((15.57, -7.12), (15.57, -10))
            Line((15.57, -10), (20.45, -10))
        make_face()
    extrude(amount=-CUT_EXTRUDE1_DEPTH, mode=Mode.SUBTRACT)

    # Fillet3
    fillet3_edges = [body_3.edges().sort_by_distance(p)[0] for p in [
        (20.45, 10, 22.55),
        (20.45, -10, 22.55),
        (-20.45, -10, 22.55),
        (-20.45, 10, 22.55),
    ]]
    fillet(fillet3_edges, radius=FILLET3_R)

    # Sketch14 → Boss-Extrude12 (add)
    with BuildSketch(Plane(origin=(20.45, 0, 0), x_dir=(0, 0, -1), z_dir=(1, 0, 0))):
        with Locations((-22.3, 0)):
            Rectangle(SKETCH14_W, SKETCH14_H)
    extrude(amount=BOSS_EXTRUDE12_DEPTH, taper=BOSS_EXTRUDE12_TAPER)


with BuildPart() as part_1:
    add(part.part)

    add(body_2.part)  # Boss-Extrude11 merges body 2
    # Sketch13 → Boss-Extrude11 (add)
    with BuildSketch(Plane(origin=(0, 0, -7.2), x_dir=(-1, 0, 0), z_dir=(0, 0, -1)).offset(BOSS_EXTRUDE11_START)):
        with BuildLine():
            Line((20.45, 8.85), (25.5, 8.85))
            ThreePointArc((25.5, 8.85), (26.560660172, 8.410660172), (27, 7.35))
            Line((27, 7.35), (27, 6.7))
            ThreePointArc((27, 6.7), (26.853553391, 6.346446609), (26.5, 6.2))
            Line((26.5, 6.2), (26.133030278, 6.2))
            ThreePointArc((26.133030278, 6.2), (25.933030278, 6.241742431), (25.766424222, 6.36))
            ThreePointArc((25.766424222, 6.36), (22.3, 5), (25.766424222, 3.64))
            ThreePointArc((25.766424222, 3.64), (25.933030278, 3.758257569), (26.133030278, 3.8))
            Line((26.133030278, 3.8), (26.5, 3.8))
            ThreePointArc((26.5, 3.8), (26.853553391, 3.653553391), (27, 3.3))
            Line((27, 3.3), (27, -3.3))
            ThreePointArc((27, -3.3), (26.853553391, -3.653553391), (26.5, -3.8))
            Line((26.5, -3.8), (26.133030278, -3.8))
            ThreePointArc((26.133030278, -3.8), (25.933030278, -3.758257569), (25.766424222, -3.64))
            ThreePointArc((25.766424222, -3.64), (22.3, -5), (25.766424222, -6.36))
            ThreePointArc((25.766424222, -6.36), (25.933030278, -6.241742431), (26.133030278, -6.2))
            Line((26.133030278, -6.2), (26.5, -6.2))
            ThreePointArc((26.5, -6.2), (26.853553391, -6.346446609), (27, -6.7))
            Line((27, -6.7), (27, -7.35))
            ThreePointArc((27, -7.35), (26.560660172, -8.410660172), (25.5, -8.85))
            Line((25.5, -8.85), (20.45, -8.85))
            Line((20.45, -8.85), (20.45, 8.85))
        make_face()
    boss_extrude11 = extrude(amount=-BOSS_EXTRUDE11_DEPTH)

    # Mirror1: Boss-Extrude11 across plane
    add(boss_extrude11.mirror(Plane(origin=(0, 0, 0), x_dir=(0, 0, 1), z_dir=(1, 0, 0))))


solid = Compound([body_3.part, part_1.part])
